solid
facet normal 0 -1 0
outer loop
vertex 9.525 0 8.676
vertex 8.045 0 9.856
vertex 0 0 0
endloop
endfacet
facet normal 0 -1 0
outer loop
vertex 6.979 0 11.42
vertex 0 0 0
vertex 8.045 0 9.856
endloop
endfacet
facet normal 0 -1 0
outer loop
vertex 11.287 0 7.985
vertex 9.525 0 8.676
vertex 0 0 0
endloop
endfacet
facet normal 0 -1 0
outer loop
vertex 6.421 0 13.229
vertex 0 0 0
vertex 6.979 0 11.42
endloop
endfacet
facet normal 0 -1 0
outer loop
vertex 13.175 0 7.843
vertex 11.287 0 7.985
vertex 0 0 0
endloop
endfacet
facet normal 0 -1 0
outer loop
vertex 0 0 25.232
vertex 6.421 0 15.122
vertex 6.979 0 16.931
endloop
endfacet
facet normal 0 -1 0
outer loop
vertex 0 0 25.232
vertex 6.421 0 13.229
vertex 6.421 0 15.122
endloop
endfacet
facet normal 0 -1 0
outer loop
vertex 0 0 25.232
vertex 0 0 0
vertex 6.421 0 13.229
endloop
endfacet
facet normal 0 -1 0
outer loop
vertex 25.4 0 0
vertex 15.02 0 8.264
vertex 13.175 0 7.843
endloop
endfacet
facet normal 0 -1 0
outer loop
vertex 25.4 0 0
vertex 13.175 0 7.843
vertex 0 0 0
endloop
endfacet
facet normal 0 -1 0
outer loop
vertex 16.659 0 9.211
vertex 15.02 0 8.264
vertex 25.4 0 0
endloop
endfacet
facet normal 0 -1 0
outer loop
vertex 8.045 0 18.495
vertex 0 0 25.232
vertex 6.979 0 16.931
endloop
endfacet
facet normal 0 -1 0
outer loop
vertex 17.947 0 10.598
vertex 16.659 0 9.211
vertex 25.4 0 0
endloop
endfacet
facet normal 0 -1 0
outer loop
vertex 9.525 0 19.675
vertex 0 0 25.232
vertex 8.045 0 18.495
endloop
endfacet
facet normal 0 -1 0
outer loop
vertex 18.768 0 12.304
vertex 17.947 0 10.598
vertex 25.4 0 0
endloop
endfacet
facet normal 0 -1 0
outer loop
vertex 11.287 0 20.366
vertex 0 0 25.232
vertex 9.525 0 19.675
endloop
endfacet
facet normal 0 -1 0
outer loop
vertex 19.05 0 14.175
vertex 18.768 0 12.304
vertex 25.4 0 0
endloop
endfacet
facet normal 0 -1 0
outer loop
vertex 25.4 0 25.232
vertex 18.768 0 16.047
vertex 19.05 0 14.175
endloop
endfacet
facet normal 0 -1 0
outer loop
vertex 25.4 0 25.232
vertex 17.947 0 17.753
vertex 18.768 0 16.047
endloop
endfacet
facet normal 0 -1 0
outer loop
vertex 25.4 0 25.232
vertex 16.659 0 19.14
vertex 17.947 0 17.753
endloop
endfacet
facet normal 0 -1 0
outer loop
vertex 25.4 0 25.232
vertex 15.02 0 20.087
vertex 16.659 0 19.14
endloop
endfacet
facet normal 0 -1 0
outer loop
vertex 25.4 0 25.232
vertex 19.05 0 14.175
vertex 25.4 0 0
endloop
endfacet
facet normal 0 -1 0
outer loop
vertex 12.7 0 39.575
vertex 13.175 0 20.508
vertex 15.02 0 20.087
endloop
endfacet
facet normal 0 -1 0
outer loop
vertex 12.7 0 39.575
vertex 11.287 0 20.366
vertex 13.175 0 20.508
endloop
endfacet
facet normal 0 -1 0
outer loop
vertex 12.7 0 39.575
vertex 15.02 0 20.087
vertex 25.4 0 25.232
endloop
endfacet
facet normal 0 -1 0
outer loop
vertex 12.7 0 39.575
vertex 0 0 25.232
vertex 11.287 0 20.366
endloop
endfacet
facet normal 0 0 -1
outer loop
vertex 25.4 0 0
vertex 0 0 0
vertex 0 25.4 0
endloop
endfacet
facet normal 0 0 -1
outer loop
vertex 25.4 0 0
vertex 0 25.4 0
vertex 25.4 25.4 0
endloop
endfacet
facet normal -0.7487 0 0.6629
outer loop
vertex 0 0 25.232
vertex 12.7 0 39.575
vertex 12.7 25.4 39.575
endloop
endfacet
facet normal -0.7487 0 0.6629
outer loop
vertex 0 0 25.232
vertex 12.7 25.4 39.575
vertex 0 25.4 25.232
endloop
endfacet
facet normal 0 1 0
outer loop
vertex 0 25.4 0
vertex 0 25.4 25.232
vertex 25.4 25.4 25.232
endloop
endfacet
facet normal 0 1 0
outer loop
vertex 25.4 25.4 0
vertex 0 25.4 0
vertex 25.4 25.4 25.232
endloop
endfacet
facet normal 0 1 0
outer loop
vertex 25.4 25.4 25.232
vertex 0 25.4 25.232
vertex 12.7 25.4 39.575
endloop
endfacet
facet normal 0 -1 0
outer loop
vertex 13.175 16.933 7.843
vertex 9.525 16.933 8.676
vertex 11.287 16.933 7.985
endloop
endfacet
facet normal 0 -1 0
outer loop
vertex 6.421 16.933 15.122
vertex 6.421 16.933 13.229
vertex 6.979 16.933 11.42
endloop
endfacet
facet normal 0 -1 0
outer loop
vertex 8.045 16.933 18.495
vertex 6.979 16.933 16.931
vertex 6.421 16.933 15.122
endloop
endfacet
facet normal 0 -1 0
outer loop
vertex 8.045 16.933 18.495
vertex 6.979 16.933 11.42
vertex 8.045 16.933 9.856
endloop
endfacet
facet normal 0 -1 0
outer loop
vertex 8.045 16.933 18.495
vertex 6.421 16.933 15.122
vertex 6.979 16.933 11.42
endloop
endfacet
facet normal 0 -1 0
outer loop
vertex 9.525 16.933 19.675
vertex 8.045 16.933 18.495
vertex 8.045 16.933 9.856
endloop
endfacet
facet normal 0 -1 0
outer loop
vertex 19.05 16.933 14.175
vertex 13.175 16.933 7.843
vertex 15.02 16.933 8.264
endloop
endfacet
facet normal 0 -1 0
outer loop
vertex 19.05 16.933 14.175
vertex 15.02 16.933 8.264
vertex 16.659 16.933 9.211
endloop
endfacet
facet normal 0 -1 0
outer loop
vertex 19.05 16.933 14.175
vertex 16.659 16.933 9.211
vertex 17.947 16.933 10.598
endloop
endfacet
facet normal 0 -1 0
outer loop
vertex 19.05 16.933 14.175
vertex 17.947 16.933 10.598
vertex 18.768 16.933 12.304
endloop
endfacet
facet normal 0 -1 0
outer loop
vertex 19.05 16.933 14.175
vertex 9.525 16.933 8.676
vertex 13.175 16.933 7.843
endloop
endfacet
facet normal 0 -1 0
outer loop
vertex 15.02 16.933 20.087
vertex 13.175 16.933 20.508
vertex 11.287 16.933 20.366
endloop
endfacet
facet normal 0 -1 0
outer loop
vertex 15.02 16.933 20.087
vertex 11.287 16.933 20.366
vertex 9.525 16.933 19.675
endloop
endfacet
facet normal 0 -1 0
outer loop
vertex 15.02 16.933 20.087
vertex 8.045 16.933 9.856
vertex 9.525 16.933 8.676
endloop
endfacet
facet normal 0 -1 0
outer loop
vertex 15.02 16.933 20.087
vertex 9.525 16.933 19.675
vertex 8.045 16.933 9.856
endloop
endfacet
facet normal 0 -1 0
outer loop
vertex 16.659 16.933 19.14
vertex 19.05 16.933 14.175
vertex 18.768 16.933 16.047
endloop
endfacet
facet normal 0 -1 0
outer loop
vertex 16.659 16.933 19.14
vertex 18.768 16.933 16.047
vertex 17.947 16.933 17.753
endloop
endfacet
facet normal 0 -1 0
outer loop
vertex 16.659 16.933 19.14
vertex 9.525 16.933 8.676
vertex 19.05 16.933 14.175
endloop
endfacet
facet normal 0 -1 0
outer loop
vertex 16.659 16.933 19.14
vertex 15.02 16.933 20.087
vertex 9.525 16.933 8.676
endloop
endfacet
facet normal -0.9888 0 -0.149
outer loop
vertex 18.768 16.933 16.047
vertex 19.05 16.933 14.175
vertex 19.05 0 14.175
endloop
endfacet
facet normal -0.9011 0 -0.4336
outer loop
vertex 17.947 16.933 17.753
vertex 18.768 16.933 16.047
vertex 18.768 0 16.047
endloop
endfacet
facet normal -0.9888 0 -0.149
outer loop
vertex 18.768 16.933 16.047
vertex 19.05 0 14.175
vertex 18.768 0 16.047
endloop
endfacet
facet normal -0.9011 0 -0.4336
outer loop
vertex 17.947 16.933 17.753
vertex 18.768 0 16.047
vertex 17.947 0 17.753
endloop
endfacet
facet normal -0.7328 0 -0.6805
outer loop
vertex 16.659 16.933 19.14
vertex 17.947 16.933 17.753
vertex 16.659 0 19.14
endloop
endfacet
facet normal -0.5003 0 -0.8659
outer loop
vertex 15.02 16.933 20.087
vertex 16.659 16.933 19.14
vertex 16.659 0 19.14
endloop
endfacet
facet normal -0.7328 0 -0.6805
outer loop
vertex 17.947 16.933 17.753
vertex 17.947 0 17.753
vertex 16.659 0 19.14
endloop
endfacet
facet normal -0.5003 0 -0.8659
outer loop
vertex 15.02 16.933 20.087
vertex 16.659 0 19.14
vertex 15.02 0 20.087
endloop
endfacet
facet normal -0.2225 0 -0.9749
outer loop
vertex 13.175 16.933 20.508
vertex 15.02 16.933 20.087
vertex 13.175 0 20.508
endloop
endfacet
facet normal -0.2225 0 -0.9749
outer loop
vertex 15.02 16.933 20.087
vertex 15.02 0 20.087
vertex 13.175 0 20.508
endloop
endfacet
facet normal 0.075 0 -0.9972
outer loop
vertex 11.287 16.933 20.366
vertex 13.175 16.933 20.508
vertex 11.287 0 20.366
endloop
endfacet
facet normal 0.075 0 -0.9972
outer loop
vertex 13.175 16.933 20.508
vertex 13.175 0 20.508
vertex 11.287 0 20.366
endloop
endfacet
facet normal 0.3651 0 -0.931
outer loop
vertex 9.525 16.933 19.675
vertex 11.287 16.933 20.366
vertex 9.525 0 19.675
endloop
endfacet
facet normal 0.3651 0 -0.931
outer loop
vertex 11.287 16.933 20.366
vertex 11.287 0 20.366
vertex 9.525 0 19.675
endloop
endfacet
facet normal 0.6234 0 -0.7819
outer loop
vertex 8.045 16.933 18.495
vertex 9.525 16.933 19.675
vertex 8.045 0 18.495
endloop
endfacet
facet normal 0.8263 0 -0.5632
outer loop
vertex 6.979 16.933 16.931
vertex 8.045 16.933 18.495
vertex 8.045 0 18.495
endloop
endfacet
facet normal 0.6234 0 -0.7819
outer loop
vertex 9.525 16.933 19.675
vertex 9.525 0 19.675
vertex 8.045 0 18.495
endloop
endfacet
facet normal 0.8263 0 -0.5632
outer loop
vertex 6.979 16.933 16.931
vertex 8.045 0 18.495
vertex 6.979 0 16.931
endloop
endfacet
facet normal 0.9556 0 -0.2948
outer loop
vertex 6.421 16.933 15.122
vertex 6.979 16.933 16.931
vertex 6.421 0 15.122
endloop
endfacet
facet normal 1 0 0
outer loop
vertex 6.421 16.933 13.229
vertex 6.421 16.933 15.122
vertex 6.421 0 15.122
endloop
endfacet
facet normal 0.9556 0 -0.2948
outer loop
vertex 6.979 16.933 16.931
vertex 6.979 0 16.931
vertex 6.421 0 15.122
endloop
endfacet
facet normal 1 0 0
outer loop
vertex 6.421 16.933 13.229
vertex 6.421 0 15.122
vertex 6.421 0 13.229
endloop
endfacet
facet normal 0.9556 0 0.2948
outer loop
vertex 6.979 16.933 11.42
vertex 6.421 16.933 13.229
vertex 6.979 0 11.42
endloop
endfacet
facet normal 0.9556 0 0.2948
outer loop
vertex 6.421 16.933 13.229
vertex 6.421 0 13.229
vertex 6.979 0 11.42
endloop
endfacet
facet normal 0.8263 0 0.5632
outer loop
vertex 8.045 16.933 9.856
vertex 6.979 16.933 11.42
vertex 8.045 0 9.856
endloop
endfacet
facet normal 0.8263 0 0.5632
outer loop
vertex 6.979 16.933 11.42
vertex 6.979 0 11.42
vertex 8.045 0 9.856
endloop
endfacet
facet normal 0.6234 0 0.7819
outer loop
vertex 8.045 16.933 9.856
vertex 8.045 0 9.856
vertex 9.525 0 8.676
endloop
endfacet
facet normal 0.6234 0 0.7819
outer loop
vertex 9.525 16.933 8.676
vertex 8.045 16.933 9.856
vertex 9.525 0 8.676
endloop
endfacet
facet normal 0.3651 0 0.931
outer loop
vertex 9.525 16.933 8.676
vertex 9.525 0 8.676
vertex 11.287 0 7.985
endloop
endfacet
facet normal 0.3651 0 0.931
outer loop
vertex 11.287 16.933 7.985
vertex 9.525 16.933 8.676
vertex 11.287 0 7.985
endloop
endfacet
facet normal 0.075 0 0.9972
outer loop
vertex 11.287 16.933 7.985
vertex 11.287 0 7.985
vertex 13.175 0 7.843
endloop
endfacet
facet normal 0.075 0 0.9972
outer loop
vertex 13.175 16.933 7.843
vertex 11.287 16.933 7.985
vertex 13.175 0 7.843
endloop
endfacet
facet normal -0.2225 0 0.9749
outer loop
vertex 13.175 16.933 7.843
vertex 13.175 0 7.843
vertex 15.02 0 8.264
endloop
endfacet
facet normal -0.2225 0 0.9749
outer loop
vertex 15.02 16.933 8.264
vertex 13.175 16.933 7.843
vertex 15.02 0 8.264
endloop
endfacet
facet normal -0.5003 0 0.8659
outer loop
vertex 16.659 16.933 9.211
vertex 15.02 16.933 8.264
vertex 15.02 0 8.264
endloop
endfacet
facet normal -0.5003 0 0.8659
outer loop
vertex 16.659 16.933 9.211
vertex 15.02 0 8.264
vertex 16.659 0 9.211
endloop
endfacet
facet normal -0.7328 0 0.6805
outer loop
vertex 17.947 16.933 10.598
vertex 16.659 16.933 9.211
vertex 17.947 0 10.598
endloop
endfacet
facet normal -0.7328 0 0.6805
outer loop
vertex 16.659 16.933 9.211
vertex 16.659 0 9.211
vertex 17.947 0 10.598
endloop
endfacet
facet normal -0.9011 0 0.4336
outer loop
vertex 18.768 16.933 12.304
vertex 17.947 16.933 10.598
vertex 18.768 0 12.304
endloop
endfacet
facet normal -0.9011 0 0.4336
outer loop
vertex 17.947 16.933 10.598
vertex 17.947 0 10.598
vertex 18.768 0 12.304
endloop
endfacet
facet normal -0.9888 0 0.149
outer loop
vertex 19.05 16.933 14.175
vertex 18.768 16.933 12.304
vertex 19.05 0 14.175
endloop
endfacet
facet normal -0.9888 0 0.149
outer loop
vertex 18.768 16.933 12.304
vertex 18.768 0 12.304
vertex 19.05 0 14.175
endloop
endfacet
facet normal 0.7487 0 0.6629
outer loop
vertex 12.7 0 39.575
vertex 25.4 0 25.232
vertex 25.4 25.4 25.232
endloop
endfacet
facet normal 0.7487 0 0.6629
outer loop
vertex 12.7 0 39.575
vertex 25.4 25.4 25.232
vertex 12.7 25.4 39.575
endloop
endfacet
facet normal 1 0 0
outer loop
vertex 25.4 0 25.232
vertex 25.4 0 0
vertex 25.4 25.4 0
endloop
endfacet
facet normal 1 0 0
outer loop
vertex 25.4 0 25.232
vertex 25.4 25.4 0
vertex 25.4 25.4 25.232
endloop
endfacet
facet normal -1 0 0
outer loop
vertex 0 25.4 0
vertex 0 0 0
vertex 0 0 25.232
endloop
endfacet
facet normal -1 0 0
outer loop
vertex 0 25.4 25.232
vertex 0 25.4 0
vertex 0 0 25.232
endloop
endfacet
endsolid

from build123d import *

# Parameters (mm, degrees)
F1_W     = 25.4
F1_H     = 25.2323417494
F2_DEPTH = 25.4
F3_R     = 6.35
F4_DEPTH = 16.9333333333


# Not quite as in the source:
# - the program builds the solid bodies; features that only make, move or delete a surface that nothing else refers to are left out


with BuildPart() as f2:
    # F1 (on Front) → F2 (new body)
    with BuildSketch(Plane.XZ):
        Polygon((12.7, 39.5754580502), (0, 25.2323417494), (25.4, 25.2323417494), align=None)
        with Locations((12.7, 12.6161708747)):
            Rectangle(F1_W, F1_H)
    extrude(amount=-F2_DEPTH)

    # F3 (on face) → F4 (cut)
    with BuildSketch(Plane.XZ):
        with Locations((12.7, 14.1754580502)):
            Circle(F3_R)
    extrude(amount=-F4_DEPTH, mode=Mode.SUBTRACT)


solid = f2.part
